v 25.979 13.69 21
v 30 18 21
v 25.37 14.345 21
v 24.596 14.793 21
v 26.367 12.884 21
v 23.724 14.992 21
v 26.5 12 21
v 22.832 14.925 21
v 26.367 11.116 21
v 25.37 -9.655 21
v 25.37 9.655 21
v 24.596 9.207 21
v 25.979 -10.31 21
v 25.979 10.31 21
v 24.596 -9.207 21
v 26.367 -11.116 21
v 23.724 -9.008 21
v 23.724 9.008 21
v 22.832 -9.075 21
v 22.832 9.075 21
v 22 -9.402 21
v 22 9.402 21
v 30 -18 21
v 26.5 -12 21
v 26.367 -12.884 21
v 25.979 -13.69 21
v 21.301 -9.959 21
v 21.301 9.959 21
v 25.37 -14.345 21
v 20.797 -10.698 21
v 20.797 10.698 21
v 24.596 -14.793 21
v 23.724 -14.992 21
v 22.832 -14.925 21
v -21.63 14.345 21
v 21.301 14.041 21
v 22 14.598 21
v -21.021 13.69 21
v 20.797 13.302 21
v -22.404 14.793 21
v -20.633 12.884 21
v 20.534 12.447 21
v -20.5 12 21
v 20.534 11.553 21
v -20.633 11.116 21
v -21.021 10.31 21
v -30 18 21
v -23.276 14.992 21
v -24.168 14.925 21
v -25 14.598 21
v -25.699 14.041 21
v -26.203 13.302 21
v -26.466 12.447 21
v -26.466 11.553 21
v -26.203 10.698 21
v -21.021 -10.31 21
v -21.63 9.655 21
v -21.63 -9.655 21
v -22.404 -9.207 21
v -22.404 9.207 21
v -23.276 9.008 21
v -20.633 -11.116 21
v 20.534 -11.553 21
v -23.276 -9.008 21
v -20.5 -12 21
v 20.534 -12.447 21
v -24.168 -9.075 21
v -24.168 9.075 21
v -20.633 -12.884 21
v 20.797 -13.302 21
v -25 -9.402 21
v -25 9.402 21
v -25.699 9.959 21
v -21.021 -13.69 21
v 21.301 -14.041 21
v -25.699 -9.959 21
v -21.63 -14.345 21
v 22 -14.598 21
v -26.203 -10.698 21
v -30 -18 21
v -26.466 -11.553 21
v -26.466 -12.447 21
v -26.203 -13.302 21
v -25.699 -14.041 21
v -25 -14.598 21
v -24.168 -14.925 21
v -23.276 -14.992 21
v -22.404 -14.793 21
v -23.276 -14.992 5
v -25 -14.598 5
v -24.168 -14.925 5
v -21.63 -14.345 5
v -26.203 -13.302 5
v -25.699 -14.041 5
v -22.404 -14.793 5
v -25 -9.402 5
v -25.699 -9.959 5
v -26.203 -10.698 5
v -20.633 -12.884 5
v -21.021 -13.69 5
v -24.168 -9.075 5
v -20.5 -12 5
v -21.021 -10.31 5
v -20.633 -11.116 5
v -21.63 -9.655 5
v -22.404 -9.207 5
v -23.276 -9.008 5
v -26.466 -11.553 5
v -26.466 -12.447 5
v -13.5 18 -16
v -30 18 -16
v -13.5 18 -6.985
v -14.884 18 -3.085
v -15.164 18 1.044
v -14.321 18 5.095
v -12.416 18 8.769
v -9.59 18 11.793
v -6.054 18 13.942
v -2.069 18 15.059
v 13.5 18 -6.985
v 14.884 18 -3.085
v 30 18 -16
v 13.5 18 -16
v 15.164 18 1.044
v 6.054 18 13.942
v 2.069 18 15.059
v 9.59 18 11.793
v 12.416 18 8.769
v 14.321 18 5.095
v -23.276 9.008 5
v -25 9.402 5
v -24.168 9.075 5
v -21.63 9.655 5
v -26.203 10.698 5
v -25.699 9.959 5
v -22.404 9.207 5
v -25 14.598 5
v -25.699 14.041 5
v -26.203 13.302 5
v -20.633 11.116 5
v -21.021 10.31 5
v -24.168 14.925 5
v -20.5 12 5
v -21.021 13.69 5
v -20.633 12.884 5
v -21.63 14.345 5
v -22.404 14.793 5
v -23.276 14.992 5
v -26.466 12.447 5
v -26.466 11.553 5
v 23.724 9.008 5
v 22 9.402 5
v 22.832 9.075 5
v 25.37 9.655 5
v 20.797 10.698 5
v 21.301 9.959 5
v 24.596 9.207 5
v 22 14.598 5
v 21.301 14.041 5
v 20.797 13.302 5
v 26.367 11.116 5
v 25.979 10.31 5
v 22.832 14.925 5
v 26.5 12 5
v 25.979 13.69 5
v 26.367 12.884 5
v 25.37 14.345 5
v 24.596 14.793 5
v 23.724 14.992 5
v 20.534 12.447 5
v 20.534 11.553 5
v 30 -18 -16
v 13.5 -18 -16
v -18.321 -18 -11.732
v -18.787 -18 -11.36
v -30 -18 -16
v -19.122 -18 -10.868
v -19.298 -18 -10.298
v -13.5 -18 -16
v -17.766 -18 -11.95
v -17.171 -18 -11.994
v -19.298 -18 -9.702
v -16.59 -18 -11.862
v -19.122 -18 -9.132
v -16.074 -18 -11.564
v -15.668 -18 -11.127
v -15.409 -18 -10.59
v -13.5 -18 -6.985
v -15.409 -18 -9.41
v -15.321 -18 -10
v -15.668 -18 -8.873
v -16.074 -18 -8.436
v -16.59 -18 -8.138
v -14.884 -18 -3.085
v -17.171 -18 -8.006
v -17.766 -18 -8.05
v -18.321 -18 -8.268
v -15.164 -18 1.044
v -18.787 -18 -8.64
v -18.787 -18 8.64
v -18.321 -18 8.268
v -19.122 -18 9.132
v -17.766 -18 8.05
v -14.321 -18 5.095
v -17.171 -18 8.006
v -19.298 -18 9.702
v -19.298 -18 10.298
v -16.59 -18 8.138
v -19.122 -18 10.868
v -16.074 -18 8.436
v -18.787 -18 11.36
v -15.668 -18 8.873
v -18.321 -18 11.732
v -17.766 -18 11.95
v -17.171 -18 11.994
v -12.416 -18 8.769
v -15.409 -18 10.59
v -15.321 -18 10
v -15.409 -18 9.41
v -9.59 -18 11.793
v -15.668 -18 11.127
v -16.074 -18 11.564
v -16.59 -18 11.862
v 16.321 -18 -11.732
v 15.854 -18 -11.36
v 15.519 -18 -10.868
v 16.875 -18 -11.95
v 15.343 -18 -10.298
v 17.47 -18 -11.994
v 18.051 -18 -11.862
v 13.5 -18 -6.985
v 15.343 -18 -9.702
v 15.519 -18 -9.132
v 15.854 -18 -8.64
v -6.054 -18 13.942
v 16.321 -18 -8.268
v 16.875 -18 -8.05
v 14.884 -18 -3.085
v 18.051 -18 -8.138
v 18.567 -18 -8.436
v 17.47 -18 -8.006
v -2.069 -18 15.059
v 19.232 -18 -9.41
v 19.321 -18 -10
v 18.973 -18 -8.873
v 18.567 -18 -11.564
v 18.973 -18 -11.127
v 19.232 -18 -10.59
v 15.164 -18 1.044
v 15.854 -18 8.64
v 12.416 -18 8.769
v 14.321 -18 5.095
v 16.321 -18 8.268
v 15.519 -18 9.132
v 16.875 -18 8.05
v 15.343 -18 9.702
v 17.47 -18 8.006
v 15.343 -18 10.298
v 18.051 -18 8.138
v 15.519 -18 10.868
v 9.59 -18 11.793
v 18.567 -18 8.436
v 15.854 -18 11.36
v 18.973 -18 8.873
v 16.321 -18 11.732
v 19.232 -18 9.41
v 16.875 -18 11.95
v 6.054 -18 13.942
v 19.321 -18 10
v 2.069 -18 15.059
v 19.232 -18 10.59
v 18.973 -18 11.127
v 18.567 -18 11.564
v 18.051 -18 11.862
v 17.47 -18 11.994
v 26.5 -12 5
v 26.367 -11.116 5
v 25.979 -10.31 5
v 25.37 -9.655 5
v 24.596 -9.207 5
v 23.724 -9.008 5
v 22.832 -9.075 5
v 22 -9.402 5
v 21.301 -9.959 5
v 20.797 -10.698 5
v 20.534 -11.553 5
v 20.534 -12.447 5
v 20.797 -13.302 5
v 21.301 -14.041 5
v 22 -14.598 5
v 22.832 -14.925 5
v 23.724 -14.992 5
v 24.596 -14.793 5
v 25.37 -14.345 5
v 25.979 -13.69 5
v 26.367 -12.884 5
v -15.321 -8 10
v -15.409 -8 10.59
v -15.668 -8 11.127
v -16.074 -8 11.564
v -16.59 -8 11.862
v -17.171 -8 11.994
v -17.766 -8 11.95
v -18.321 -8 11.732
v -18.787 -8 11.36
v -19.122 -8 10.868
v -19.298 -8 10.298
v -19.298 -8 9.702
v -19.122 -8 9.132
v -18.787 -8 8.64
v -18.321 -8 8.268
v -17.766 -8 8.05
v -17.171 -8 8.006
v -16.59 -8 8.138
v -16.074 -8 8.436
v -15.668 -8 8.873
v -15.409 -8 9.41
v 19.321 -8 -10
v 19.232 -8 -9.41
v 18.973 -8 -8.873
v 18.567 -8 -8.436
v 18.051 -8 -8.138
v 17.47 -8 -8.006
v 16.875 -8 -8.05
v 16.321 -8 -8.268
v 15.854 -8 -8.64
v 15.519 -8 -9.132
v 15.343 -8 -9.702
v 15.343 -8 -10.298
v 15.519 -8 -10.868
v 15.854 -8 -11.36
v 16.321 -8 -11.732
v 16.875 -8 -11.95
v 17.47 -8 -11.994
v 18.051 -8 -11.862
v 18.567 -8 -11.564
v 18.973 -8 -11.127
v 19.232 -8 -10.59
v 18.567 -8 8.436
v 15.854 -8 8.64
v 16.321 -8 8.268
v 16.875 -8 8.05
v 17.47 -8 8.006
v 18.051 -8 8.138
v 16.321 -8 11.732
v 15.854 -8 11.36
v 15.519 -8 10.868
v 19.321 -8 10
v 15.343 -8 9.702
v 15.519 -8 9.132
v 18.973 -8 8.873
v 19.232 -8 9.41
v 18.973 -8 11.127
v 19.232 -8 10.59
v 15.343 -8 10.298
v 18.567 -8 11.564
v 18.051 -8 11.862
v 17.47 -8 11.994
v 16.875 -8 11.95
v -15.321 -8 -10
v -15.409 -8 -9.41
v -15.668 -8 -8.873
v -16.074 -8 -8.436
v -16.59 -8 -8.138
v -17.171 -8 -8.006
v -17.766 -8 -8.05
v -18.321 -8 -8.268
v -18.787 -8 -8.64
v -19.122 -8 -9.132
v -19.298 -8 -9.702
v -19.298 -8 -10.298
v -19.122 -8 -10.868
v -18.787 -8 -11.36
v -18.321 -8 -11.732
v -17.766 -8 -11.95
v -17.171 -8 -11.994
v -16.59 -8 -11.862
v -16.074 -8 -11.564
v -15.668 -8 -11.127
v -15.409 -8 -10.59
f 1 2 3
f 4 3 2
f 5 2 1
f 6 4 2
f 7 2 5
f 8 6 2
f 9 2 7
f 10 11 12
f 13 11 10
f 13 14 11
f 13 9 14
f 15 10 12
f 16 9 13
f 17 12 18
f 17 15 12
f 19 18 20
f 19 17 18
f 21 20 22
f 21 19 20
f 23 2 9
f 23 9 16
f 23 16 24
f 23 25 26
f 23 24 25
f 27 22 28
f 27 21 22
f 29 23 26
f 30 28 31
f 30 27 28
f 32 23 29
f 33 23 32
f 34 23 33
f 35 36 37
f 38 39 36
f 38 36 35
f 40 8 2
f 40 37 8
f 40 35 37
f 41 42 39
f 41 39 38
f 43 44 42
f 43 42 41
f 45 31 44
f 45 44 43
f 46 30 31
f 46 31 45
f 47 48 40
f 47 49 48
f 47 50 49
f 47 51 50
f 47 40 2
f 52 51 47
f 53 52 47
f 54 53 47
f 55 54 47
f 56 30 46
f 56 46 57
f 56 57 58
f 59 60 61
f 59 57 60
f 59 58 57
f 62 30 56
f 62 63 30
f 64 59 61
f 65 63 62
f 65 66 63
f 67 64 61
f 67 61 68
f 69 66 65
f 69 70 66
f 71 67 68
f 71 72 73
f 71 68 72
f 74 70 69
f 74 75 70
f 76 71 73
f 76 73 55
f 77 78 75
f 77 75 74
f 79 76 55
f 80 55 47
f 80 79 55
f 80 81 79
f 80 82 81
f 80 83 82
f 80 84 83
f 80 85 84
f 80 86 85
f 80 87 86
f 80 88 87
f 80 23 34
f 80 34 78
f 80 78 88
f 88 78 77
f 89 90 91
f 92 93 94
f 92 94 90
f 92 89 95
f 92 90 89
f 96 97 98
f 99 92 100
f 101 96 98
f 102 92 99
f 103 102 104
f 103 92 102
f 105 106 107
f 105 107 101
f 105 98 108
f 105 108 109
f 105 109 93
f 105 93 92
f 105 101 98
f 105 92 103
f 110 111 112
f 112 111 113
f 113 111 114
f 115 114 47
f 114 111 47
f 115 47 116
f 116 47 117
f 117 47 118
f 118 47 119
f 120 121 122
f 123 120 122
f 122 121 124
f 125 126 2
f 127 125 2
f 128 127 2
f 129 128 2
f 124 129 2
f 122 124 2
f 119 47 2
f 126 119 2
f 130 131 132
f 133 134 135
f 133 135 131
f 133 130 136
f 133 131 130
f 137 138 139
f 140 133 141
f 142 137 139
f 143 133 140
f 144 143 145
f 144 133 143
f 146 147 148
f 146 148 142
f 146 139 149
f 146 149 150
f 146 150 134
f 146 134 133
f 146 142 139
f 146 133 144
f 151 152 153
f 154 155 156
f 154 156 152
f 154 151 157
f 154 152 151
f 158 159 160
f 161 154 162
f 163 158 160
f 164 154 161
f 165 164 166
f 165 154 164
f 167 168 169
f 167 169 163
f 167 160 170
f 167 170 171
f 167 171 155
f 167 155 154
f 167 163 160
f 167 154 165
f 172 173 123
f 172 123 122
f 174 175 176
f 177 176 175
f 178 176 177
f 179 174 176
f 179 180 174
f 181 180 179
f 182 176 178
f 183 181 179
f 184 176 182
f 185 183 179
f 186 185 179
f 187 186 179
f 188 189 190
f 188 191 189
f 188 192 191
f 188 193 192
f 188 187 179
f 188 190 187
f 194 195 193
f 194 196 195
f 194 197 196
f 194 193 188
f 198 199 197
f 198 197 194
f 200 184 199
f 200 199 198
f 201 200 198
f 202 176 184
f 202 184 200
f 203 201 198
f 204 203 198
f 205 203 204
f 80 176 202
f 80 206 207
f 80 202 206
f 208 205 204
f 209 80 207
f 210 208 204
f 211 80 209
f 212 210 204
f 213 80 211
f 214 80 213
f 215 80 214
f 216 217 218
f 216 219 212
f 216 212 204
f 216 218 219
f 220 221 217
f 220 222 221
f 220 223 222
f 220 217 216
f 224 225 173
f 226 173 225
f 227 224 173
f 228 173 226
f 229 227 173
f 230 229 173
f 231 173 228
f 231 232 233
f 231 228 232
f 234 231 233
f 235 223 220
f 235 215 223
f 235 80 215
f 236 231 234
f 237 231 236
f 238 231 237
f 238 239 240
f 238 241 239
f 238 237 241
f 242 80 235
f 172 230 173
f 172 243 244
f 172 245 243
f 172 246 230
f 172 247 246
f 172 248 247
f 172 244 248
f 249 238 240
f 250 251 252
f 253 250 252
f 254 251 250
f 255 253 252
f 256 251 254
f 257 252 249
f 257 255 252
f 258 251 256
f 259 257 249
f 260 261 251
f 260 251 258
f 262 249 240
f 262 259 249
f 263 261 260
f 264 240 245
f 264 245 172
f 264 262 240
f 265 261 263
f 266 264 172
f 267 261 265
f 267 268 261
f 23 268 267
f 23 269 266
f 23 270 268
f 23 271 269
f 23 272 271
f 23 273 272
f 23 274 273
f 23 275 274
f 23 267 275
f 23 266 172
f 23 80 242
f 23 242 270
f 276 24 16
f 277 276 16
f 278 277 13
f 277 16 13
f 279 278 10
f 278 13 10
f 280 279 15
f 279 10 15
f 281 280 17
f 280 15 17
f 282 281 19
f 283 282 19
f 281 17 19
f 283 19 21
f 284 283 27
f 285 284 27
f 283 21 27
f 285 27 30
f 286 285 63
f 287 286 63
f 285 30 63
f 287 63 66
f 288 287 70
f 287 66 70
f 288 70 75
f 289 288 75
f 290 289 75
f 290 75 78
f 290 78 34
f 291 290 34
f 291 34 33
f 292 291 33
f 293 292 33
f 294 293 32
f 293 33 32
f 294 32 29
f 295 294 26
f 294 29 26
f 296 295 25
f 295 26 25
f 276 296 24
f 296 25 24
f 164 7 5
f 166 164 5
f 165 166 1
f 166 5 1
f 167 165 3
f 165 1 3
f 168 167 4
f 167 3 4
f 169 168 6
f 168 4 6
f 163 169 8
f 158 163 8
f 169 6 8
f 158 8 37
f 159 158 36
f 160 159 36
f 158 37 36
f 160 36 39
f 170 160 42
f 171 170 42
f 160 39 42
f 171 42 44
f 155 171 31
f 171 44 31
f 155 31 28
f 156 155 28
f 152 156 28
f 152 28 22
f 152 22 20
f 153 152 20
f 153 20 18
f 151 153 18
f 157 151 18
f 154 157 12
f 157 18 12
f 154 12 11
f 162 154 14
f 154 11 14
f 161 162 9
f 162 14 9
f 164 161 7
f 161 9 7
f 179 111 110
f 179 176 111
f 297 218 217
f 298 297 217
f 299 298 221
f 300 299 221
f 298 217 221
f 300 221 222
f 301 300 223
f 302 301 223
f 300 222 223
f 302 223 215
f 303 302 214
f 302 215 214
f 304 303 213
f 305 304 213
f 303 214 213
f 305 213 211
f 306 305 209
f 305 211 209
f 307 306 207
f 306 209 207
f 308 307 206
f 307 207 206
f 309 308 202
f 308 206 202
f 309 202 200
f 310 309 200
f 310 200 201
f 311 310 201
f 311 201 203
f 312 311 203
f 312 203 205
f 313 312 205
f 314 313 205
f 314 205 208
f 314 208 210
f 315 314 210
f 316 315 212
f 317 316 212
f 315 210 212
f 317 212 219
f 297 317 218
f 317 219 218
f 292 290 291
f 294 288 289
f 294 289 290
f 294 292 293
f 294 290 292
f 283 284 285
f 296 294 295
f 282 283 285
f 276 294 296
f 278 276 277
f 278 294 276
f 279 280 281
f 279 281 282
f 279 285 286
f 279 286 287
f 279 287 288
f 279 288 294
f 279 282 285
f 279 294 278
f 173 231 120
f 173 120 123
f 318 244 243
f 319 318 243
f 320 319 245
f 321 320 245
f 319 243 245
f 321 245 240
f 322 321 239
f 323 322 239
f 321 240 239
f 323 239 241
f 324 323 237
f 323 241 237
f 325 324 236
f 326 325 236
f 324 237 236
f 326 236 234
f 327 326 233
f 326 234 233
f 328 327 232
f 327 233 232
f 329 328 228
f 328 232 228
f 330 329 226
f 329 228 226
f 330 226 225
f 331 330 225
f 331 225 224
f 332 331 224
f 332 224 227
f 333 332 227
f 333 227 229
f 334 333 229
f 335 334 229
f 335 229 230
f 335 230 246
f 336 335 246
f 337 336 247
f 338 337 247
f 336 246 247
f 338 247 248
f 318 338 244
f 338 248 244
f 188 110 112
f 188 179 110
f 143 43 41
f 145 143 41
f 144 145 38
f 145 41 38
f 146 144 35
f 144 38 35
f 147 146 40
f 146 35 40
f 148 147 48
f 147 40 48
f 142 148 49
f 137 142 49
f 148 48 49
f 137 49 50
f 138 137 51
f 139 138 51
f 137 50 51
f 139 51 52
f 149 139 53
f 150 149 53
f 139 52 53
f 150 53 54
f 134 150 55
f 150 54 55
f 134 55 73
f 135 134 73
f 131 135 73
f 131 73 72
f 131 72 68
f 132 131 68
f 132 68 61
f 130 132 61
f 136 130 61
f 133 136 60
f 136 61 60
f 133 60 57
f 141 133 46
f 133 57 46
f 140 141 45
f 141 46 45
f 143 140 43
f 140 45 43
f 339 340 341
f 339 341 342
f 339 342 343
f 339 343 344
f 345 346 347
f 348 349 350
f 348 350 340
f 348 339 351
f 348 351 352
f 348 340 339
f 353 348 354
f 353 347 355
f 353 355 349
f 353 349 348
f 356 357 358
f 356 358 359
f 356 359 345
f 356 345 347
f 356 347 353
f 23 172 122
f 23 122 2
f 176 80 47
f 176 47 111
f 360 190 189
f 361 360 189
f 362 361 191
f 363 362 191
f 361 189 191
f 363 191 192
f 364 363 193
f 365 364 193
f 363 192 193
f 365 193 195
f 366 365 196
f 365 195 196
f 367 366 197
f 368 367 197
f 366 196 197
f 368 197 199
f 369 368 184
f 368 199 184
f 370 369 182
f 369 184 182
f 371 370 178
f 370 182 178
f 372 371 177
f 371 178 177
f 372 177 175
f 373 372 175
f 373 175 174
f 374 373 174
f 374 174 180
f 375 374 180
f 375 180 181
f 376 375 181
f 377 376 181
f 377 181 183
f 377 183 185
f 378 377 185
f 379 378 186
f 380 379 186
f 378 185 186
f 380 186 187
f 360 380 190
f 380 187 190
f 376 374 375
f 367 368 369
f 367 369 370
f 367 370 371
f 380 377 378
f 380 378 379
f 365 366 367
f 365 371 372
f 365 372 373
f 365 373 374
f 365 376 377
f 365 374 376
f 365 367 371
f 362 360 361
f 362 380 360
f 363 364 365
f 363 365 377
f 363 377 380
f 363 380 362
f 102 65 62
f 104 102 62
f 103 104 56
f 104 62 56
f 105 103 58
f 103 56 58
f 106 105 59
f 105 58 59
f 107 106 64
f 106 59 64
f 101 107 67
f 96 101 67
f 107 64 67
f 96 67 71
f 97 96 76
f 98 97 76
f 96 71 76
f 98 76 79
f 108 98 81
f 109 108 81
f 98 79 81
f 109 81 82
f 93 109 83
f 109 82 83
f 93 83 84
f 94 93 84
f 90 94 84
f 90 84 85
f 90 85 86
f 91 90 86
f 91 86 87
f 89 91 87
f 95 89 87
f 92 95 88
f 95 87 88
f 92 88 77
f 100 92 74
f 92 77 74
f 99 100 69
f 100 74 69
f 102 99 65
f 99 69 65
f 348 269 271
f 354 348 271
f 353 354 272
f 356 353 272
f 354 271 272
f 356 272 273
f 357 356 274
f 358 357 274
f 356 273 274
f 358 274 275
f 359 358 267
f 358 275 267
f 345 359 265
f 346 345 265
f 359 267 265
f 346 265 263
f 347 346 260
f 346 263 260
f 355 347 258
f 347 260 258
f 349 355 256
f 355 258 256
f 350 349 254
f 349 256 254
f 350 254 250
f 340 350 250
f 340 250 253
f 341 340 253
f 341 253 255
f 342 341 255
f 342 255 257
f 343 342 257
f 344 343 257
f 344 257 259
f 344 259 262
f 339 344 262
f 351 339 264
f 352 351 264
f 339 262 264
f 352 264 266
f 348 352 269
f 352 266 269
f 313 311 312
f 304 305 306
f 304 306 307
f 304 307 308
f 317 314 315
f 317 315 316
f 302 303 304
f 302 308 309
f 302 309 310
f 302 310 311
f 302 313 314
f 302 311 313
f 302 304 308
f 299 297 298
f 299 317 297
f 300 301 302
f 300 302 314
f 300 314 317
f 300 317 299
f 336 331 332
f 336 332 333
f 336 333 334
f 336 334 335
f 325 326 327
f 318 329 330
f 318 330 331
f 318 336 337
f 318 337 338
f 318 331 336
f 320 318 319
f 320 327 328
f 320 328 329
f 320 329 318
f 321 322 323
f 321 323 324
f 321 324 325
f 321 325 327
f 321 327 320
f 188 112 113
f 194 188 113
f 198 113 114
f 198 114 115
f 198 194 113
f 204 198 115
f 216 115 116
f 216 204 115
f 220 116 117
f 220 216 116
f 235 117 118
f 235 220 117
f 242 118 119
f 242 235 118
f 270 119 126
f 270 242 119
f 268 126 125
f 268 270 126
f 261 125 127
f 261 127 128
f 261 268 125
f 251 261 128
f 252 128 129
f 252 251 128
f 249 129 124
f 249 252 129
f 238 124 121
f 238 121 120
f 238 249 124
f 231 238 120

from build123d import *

# Parameters (mm, degrees)
F1_DEPTH = 18
F2_R     = 2
F4_DEPTH = 10
F3_R     = 3
F5_DEPTH = 16


with BuildPart() as f1:
    # F0 (on Front) → F1 (new body, symmetric)
    with BuildSketch(Plane.XZ):
        with BuildLine():
            ThreePointArc((-13.5, -6.984984), (0, 15.2), (13.5, -6.984984))
            Line((13.5, -6.984984), (13.5, -16))
            Line((13.5, -16), (30, -16))
            Line((30, -16), (30, 21))
            Line((30, 21), (-30, 21))
            Line((-30, 21), (-30, -16))
            Line((-30, -16), (-13.5, -16))
            Line((-13.5, -16), (-13.5, -6.984984))
        make_face()
    extrude(amount=F1_DEPTH, both=True)

    # F2 (on face) → F4 (cut)
    with BuildSketch(Plane.XZ.offset(18)):
        with Locations((-17.320508, 10)):
            Circle(F2_R)
        with Locations((17.320508, 10)):
            Circle(F2_R)
        with Locations((17.320508, -10)):
            Circle(F2_R)
        with Locations((-17.320508, -10)):
            Circle(F2_R)
    extrude(amount=-F4_DEPTH, mode=Mode.SUBTRACT)

    # F3 (on face) → F5 (cut)
    with BuildSketch(Plane.XY.offset(21)):
        with Locations((-23.5, 12)):
            Circle(F3_R)
        with Locations((23.5, 12)):
            Circle(F3_R)
        with Locations((23.5, -12)):
            Circle(F3_R)
        with Locations((-23.5, -12)):
            Circle(F3_R)
    extrude(amount=-F5_DEPTH, mode=Mode.SUBTRACT)


solid = f1.part
